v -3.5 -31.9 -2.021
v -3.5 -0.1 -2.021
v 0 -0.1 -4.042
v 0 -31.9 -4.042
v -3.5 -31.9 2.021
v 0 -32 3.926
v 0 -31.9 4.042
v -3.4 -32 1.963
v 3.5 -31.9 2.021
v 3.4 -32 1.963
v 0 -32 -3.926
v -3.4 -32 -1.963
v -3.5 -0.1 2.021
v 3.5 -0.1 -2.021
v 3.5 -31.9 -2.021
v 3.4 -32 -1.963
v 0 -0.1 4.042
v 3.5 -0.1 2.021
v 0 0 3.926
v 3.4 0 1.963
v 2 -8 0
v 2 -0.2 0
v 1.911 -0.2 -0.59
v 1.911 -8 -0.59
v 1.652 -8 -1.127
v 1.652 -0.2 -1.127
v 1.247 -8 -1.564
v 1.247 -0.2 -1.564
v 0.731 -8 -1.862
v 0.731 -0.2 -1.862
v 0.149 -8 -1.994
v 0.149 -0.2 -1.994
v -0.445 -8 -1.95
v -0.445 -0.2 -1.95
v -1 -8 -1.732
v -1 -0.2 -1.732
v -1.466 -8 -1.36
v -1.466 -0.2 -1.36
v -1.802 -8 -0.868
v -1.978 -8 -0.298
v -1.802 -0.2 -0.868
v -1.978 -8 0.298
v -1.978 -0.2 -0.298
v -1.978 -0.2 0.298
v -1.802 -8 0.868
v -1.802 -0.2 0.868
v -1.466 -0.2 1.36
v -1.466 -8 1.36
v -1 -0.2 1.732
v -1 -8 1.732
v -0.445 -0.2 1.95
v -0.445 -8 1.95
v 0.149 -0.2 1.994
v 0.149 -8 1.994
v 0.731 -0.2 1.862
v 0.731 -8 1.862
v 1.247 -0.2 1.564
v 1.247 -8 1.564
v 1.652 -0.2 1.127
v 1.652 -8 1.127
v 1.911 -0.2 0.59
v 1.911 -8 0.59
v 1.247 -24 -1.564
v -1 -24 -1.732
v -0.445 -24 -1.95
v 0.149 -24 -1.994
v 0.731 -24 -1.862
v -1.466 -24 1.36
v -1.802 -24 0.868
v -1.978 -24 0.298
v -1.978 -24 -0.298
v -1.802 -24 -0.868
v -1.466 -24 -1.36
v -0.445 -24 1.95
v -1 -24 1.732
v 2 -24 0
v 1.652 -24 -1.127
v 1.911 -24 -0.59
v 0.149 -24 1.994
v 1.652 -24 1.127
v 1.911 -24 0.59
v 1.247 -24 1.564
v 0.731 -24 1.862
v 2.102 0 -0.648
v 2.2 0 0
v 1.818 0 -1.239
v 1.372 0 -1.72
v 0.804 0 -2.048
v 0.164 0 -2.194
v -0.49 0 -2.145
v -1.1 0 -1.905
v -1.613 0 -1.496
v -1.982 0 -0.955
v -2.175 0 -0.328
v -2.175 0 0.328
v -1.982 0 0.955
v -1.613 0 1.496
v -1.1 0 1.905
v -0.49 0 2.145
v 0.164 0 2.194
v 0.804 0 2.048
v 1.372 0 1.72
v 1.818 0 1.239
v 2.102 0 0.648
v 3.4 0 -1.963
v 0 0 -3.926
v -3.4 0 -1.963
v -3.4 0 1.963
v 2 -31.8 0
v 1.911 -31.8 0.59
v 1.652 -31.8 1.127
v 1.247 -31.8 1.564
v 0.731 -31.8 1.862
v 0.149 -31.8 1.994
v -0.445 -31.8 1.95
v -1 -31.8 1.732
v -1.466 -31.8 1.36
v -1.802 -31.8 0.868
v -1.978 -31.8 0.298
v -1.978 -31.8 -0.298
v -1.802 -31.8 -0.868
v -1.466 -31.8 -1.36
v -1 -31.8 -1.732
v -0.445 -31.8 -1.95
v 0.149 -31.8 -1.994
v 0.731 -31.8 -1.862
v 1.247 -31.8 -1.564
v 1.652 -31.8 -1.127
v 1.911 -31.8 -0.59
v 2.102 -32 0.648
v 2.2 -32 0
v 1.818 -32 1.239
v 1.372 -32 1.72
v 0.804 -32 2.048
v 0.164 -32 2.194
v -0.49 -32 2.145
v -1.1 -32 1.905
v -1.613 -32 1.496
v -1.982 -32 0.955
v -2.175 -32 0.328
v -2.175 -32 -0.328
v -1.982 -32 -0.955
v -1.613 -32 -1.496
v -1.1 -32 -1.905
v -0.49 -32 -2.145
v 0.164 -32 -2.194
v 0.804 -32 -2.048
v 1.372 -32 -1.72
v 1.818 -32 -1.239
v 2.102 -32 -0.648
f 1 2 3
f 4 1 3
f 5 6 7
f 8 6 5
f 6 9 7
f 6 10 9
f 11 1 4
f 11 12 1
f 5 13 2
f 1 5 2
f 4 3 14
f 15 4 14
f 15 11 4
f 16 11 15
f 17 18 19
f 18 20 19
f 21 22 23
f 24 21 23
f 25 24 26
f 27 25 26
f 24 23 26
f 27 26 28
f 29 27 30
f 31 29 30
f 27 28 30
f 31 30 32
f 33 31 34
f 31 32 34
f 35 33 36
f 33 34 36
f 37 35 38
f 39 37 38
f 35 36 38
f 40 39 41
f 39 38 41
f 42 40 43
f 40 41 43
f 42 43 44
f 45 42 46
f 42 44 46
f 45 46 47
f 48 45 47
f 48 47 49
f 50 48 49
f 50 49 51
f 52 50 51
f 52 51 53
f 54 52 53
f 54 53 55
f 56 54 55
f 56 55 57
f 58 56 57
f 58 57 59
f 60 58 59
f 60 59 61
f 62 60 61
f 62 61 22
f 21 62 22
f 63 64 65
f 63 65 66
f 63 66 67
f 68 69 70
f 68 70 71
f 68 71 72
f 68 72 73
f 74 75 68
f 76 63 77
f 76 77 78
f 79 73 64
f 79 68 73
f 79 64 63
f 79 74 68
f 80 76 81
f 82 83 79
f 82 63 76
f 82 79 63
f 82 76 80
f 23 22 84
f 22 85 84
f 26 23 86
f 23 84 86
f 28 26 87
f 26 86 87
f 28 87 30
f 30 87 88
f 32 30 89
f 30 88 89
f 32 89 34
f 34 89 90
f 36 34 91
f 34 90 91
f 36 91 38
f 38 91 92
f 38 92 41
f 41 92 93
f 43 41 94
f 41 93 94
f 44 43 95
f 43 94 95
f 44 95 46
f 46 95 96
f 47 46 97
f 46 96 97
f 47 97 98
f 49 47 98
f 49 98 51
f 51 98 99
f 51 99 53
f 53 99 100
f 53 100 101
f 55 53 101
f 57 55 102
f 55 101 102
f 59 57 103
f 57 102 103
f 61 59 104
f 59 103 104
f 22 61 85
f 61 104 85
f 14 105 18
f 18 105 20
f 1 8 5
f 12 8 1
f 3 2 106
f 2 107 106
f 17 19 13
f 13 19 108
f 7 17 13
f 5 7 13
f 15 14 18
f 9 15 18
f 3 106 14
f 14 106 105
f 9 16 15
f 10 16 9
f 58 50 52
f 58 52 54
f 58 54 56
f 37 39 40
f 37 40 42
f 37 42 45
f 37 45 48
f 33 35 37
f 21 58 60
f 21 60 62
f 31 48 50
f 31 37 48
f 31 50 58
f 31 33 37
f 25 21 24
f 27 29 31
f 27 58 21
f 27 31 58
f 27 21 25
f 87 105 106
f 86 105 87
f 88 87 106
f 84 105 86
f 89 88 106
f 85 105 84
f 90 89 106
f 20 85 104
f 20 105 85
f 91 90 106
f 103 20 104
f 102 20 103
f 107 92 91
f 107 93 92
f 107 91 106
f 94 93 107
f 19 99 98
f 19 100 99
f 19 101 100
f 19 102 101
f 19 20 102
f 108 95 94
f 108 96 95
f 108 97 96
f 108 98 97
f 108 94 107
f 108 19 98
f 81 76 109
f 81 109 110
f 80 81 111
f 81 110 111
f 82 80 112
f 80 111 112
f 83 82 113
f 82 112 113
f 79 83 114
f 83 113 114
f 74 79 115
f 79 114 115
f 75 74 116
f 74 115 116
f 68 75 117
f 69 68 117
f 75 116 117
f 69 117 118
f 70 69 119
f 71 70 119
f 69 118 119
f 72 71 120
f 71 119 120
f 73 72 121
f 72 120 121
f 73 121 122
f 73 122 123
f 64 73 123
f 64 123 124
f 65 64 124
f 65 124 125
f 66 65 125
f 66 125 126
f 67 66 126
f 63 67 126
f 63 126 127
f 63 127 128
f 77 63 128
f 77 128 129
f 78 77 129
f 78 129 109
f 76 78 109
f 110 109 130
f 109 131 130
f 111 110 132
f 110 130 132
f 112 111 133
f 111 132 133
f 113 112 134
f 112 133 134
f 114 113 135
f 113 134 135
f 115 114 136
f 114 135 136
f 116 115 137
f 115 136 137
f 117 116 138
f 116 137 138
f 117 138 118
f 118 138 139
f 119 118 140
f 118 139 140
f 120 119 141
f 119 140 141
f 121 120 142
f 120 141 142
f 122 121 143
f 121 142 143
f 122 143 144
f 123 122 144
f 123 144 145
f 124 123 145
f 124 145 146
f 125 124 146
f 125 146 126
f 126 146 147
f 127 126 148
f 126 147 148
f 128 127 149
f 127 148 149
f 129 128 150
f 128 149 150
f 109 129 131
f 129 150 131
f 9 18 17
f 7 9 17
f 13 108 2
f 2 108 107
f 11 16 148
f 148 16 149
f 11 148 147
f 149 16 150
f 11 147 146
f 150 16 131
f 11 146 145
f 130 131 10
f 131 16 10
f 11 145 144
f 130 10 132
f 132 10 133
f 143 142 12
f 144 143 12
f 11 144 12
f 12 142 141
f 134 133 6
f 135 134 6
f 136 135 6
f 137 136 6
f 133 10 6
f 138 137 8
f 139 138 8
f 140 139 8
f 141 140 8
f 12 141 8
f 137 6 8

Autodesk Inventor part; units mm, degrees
ref_plane "YZ Plane" through (0, 0, 0) normal (1, 0, 0) x (0, 1, 0)
ref_plane "XZ Plane" through (0, 0, 0) normal (0, 1, 0) x (-1, 0, 0)
ref_plane "XY Plane" through (0, 0, 0) normal (0, 0, 1) x (1, 0, 0)
sketch "Sketch1" plane through (0, 0, 0) normal (0, 1, 0) x (-1, 0, 0)
  line L0 (-3.5, -2.0207) -> (-3.5, 2.0207)
  line L1 (-3.5, 2.0207) -> (0, 4.0415)
  line L2 (0, 4.0415) -> (3.5, 2.0207)
  line L3 (3.5, 2.0207) -> (3.5, -2.0207)
  line L4 (3.5, -2.0207) -> (0, -4.0415)
  line L5 (0, -4.0415) -> (-3.5, -2.0207)
  point P0 (0, 0)
  point P1 (0, 0)
  dimension "d0" = 7
extrude "Extrusion1" add sketch "Sketch1" against normal blind 32
chamfer "Chamfer1" distance 0.1 angle 45 12 edges at (-1.75, -32, 3.0311) (1.75, -32, 3.0311) (3.5, -32, 0) (1.75, -32, -3.0311) (-1.75, -32, -3.0311) (-3.5, -32, 0) (1.75, 0, 3.0311) (-1.75, 0, 3.0311) (-3.5, 0, 0) (-1.75, 0, -3.0311) (1.75, 0, -3.0311) (3.5, 0, 0)
sketch "Sketch2" plane through (0, -32, 0) normal (0, -1, 0) x (1, 0, 0)
  circle A0 centre (0, 0) radius 2
  dimension "d6" = 4
extrude "Extrusion2" cut sketch "Sketch2" against normal blind 8
sketch "Sketch3" plane through (0, 0, 0) normal (0, 1, 0) x (1, 0, 0)
  circle A0 centre (0, 0) radius 2
  dimension "d9" = 4
extrude "Extrusion3" cut sketch "Sketch3" against normal blind 8
chamfer "Chamfer2" distance 0.2 angle 45 2 edges at (-2, 0, 0) (-2, -32, 0)
thread "Thread1" size "M4x0.7" class "6H" standard "ANSI Metric M Profile" full length
thread "Thread2" size "M4x0.7" class "6H" standard "ANSI Metric M Profile" full length
properties part number "09-0001" material "Aluminum 6061"
